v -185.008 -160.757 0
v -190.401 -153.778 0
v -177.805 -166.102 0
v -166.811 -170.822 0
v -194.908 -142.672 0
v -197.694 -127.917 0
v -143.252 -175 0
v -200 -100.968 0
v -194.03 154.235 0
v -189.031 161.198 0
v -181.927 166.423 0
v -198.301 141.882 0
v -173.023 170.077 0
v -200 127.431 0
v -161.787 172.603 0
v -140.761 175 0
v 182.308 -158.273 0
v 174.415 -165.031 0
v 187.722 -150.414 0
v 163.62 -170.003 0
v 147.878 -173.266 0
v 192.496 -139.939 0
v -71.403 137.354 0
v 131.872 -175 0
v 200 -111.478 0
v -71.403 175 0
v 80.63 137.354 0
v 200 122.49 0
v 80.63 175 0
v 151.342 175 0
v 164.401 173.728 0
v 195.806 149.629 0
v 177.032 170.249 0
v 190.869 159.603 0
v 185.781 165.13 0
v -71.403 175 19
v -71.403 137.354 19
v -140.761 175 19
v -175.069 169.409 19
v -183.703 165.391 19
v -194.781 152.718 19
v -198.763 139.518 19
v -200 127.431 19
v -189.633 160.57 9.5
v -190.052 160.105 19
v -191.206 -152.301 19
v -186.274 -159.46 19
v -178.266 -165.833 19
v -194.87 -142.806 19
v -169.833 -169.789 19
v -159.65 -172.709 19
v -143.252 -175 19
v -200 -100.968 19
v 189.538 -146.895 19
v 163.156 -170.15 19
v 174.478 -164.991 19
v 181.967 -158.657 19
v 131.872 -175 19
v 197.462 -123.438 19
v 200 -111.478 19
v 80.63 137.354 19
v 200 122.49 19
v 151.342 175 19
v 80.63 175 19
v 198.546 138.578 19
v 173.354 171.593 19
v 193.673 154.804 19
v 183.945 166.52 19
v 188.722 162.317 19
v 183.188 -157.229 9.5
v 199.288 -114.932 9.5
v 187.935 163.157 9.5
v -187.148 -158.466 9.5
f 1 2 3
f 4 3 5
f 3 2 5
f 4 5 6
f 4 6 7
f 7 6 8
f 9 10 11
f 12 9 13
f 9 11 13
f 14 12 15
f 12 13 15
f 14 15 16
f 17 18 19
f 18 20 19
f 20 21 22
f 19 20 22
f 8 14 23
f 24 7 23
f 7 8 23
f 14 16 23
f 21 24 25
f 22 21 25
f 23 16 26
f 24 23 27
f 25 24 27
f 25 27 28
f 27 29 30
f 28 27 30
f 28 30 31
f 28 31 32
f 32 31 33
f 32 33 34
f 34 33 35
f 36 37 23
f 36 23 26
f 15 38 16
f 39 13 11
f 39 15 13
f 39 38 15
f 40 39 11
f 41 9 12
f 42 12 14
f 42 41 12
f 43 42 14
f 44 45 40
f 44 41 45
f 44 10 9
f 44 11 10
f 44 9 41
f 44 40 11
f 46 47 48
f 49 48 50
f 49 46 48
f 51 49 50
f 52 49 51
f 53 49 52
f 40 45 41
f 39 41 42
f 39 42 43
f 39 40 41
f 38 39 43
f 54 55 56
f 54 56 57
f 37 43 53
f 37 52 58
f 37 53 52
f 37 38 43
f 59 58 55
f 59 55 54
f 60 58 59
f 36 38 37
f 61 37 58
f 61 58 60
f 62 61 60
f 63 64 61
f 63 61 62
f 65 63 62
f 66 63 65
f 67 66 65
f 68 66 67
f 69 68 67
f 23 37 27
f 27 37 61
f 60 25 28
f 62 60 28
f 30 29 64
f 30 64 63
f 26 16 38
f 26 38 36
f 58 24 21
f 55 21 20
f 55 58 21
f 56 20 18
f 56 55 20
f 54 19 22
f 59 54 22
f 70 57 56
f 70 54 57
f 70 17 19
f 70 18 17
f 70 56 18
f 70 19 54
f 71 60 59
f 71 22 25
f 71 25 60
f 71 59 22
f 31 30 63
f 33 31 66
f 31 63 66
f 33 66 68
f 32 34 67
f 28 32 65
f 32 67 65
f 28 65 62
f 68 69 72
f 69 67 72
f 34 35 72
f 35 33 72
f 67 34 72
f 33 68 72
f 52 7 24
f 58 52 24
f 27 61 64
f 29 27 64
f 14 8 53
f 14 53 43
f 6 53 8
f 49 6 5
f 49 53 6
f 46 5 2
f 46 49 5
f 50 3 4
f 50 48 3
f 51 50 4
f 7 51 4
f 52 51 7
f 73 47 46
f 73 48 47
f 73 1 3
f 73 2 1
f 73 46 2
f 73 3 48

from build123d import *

# Parameters (mm, degrees)
F0_W      = 400
F0_H      = 350
F1_DEPTH  = 19
F3_DEPTH  = 19.001
F5_DEPTH  = 19.0010001
F7_DEPTH  = 19.0010001
F9_DEPTH  = 19.0010001
F10_W     = 152.0328149199
F10_H     = 37.6462221146
F11_DEPTH = 19.0010001


with BuildPart() as f1:
    # F0 (on Top) → F1 (new body)
    with BuildSketch(Plane.XY):
        Rectangle(F0_W, F0_H)
    extrude(amount=F1_DEPTH)

    # F2 (on face) → F3 (cut, through all)
    with BuildSketch(Plane.XY.offset(19)):
        with BuildLine():
            Line((200, 175), (151.3424734159, 175))
            add(Edge.make_bspline(
                [(151.3424734159, 175), (163.628163973, 174.5270389431), (195.7541165045, 169.8113391239), (199.6478987114, 135.2669980399), (200, 122.4896438138)],
                knots=[0.1722762022, 0.1722762022, 0.1722762022, 0.1722762022, 0.4977126924, 0.8513762401, 0.8513762401, 0.8513762401, 0.8513762401], degree=3))
            Line((200, 122.4896438138), (200, 175))
        make_face()
    extrude(amount=-F3_DEPTH, mode=Mode.SUBTRACT)

    # F4 (on face) → F5 (cut, through all)
    with BuildSketch(Plane.XY.offset(19)):
        with BuildLine():
            add(Edge.make_bspline(
                [(-140.7613994596, 175), (-150.110855442, 173.3851097158), (-195.0889612855, 174.4196814068), (-199.6708864934, 136.6798470352), (-200, 127.4311682667)],
                knots=[0, 0, 0, 0, 0.4272708141, 0.7095152118, 0.7095152118, 0.7095152118, 0.7095152118], degree=3))
            Line((-140.7613994596, 175), (-200, 175))
            Line((-200, 175), (-200, 127.4311682667))
        make_face()
    extrude(amount=-F5_DEPTH, mode=Mode.SUBTRACT)

    # F6 (on face) → F7 (cut, through all)
    with BuildSketch(Plane.XY.offset(19)):
        with BuildLine():
            add(Edge.make_bspline(
                [(-200, -100.9678691626), (-198.025562325, -115.9679433742), (-200.7344906485, -168.6506935141), (-154.2425532874, -174.1251325706), (-143.251940608, -175)],
                knots=[0, 0, 0, 0, 0.432032055, 0.8175239829, 0.8175239829, 0.8175239829, 0.8175239829], degree=3))
            Line((-200, -100.9678691626), (-200, -175))
            Line((-200, -175), (-143.251940608, -175))
        make_face()
    extrude(amount=-F7_DEPTH, mode=Mode.SUBTRACT)

    # F8 (on face) → F9 (cut, through all)
    with BuildSketch(Plane.XY.offset(19)):
        with BuildLine():
            add(Edge.make_bspline(
                [(131.8723261356, -175), (147.6494681392, -172.9795732693), (191.3520223086, -173.7383685692), (199.6154264724, -111.8109622903), (200, -111.4782392979)],
                knots=[0, 0, 0, 0, 0.4868319345, 0.9480551396, 0.9480551396, 0.9480551396, 0.9480551396], degree=3))
            Line((131.8723261356, -175), (200, -175))
            Line((200, -175), (200, -112.0964959264))
            Line((200, -112.0964959264), (200, -111.4782392979))
        make_face()
    extrude(amount=-F9_DEPTH, mode=Mode.SUBTRACT)

    # F10 (on face) → F11 (cut, through all)
    with BuildSketch(Plane.XY.offset(19)):
        with Locations((4.6131424606, 156.1768889427)):
            Rectangle(F10_W, F10_H)
    extrude(amount=-F11_DEPTH, mode=Mode.SUBTRACT)


solid = f1.part
